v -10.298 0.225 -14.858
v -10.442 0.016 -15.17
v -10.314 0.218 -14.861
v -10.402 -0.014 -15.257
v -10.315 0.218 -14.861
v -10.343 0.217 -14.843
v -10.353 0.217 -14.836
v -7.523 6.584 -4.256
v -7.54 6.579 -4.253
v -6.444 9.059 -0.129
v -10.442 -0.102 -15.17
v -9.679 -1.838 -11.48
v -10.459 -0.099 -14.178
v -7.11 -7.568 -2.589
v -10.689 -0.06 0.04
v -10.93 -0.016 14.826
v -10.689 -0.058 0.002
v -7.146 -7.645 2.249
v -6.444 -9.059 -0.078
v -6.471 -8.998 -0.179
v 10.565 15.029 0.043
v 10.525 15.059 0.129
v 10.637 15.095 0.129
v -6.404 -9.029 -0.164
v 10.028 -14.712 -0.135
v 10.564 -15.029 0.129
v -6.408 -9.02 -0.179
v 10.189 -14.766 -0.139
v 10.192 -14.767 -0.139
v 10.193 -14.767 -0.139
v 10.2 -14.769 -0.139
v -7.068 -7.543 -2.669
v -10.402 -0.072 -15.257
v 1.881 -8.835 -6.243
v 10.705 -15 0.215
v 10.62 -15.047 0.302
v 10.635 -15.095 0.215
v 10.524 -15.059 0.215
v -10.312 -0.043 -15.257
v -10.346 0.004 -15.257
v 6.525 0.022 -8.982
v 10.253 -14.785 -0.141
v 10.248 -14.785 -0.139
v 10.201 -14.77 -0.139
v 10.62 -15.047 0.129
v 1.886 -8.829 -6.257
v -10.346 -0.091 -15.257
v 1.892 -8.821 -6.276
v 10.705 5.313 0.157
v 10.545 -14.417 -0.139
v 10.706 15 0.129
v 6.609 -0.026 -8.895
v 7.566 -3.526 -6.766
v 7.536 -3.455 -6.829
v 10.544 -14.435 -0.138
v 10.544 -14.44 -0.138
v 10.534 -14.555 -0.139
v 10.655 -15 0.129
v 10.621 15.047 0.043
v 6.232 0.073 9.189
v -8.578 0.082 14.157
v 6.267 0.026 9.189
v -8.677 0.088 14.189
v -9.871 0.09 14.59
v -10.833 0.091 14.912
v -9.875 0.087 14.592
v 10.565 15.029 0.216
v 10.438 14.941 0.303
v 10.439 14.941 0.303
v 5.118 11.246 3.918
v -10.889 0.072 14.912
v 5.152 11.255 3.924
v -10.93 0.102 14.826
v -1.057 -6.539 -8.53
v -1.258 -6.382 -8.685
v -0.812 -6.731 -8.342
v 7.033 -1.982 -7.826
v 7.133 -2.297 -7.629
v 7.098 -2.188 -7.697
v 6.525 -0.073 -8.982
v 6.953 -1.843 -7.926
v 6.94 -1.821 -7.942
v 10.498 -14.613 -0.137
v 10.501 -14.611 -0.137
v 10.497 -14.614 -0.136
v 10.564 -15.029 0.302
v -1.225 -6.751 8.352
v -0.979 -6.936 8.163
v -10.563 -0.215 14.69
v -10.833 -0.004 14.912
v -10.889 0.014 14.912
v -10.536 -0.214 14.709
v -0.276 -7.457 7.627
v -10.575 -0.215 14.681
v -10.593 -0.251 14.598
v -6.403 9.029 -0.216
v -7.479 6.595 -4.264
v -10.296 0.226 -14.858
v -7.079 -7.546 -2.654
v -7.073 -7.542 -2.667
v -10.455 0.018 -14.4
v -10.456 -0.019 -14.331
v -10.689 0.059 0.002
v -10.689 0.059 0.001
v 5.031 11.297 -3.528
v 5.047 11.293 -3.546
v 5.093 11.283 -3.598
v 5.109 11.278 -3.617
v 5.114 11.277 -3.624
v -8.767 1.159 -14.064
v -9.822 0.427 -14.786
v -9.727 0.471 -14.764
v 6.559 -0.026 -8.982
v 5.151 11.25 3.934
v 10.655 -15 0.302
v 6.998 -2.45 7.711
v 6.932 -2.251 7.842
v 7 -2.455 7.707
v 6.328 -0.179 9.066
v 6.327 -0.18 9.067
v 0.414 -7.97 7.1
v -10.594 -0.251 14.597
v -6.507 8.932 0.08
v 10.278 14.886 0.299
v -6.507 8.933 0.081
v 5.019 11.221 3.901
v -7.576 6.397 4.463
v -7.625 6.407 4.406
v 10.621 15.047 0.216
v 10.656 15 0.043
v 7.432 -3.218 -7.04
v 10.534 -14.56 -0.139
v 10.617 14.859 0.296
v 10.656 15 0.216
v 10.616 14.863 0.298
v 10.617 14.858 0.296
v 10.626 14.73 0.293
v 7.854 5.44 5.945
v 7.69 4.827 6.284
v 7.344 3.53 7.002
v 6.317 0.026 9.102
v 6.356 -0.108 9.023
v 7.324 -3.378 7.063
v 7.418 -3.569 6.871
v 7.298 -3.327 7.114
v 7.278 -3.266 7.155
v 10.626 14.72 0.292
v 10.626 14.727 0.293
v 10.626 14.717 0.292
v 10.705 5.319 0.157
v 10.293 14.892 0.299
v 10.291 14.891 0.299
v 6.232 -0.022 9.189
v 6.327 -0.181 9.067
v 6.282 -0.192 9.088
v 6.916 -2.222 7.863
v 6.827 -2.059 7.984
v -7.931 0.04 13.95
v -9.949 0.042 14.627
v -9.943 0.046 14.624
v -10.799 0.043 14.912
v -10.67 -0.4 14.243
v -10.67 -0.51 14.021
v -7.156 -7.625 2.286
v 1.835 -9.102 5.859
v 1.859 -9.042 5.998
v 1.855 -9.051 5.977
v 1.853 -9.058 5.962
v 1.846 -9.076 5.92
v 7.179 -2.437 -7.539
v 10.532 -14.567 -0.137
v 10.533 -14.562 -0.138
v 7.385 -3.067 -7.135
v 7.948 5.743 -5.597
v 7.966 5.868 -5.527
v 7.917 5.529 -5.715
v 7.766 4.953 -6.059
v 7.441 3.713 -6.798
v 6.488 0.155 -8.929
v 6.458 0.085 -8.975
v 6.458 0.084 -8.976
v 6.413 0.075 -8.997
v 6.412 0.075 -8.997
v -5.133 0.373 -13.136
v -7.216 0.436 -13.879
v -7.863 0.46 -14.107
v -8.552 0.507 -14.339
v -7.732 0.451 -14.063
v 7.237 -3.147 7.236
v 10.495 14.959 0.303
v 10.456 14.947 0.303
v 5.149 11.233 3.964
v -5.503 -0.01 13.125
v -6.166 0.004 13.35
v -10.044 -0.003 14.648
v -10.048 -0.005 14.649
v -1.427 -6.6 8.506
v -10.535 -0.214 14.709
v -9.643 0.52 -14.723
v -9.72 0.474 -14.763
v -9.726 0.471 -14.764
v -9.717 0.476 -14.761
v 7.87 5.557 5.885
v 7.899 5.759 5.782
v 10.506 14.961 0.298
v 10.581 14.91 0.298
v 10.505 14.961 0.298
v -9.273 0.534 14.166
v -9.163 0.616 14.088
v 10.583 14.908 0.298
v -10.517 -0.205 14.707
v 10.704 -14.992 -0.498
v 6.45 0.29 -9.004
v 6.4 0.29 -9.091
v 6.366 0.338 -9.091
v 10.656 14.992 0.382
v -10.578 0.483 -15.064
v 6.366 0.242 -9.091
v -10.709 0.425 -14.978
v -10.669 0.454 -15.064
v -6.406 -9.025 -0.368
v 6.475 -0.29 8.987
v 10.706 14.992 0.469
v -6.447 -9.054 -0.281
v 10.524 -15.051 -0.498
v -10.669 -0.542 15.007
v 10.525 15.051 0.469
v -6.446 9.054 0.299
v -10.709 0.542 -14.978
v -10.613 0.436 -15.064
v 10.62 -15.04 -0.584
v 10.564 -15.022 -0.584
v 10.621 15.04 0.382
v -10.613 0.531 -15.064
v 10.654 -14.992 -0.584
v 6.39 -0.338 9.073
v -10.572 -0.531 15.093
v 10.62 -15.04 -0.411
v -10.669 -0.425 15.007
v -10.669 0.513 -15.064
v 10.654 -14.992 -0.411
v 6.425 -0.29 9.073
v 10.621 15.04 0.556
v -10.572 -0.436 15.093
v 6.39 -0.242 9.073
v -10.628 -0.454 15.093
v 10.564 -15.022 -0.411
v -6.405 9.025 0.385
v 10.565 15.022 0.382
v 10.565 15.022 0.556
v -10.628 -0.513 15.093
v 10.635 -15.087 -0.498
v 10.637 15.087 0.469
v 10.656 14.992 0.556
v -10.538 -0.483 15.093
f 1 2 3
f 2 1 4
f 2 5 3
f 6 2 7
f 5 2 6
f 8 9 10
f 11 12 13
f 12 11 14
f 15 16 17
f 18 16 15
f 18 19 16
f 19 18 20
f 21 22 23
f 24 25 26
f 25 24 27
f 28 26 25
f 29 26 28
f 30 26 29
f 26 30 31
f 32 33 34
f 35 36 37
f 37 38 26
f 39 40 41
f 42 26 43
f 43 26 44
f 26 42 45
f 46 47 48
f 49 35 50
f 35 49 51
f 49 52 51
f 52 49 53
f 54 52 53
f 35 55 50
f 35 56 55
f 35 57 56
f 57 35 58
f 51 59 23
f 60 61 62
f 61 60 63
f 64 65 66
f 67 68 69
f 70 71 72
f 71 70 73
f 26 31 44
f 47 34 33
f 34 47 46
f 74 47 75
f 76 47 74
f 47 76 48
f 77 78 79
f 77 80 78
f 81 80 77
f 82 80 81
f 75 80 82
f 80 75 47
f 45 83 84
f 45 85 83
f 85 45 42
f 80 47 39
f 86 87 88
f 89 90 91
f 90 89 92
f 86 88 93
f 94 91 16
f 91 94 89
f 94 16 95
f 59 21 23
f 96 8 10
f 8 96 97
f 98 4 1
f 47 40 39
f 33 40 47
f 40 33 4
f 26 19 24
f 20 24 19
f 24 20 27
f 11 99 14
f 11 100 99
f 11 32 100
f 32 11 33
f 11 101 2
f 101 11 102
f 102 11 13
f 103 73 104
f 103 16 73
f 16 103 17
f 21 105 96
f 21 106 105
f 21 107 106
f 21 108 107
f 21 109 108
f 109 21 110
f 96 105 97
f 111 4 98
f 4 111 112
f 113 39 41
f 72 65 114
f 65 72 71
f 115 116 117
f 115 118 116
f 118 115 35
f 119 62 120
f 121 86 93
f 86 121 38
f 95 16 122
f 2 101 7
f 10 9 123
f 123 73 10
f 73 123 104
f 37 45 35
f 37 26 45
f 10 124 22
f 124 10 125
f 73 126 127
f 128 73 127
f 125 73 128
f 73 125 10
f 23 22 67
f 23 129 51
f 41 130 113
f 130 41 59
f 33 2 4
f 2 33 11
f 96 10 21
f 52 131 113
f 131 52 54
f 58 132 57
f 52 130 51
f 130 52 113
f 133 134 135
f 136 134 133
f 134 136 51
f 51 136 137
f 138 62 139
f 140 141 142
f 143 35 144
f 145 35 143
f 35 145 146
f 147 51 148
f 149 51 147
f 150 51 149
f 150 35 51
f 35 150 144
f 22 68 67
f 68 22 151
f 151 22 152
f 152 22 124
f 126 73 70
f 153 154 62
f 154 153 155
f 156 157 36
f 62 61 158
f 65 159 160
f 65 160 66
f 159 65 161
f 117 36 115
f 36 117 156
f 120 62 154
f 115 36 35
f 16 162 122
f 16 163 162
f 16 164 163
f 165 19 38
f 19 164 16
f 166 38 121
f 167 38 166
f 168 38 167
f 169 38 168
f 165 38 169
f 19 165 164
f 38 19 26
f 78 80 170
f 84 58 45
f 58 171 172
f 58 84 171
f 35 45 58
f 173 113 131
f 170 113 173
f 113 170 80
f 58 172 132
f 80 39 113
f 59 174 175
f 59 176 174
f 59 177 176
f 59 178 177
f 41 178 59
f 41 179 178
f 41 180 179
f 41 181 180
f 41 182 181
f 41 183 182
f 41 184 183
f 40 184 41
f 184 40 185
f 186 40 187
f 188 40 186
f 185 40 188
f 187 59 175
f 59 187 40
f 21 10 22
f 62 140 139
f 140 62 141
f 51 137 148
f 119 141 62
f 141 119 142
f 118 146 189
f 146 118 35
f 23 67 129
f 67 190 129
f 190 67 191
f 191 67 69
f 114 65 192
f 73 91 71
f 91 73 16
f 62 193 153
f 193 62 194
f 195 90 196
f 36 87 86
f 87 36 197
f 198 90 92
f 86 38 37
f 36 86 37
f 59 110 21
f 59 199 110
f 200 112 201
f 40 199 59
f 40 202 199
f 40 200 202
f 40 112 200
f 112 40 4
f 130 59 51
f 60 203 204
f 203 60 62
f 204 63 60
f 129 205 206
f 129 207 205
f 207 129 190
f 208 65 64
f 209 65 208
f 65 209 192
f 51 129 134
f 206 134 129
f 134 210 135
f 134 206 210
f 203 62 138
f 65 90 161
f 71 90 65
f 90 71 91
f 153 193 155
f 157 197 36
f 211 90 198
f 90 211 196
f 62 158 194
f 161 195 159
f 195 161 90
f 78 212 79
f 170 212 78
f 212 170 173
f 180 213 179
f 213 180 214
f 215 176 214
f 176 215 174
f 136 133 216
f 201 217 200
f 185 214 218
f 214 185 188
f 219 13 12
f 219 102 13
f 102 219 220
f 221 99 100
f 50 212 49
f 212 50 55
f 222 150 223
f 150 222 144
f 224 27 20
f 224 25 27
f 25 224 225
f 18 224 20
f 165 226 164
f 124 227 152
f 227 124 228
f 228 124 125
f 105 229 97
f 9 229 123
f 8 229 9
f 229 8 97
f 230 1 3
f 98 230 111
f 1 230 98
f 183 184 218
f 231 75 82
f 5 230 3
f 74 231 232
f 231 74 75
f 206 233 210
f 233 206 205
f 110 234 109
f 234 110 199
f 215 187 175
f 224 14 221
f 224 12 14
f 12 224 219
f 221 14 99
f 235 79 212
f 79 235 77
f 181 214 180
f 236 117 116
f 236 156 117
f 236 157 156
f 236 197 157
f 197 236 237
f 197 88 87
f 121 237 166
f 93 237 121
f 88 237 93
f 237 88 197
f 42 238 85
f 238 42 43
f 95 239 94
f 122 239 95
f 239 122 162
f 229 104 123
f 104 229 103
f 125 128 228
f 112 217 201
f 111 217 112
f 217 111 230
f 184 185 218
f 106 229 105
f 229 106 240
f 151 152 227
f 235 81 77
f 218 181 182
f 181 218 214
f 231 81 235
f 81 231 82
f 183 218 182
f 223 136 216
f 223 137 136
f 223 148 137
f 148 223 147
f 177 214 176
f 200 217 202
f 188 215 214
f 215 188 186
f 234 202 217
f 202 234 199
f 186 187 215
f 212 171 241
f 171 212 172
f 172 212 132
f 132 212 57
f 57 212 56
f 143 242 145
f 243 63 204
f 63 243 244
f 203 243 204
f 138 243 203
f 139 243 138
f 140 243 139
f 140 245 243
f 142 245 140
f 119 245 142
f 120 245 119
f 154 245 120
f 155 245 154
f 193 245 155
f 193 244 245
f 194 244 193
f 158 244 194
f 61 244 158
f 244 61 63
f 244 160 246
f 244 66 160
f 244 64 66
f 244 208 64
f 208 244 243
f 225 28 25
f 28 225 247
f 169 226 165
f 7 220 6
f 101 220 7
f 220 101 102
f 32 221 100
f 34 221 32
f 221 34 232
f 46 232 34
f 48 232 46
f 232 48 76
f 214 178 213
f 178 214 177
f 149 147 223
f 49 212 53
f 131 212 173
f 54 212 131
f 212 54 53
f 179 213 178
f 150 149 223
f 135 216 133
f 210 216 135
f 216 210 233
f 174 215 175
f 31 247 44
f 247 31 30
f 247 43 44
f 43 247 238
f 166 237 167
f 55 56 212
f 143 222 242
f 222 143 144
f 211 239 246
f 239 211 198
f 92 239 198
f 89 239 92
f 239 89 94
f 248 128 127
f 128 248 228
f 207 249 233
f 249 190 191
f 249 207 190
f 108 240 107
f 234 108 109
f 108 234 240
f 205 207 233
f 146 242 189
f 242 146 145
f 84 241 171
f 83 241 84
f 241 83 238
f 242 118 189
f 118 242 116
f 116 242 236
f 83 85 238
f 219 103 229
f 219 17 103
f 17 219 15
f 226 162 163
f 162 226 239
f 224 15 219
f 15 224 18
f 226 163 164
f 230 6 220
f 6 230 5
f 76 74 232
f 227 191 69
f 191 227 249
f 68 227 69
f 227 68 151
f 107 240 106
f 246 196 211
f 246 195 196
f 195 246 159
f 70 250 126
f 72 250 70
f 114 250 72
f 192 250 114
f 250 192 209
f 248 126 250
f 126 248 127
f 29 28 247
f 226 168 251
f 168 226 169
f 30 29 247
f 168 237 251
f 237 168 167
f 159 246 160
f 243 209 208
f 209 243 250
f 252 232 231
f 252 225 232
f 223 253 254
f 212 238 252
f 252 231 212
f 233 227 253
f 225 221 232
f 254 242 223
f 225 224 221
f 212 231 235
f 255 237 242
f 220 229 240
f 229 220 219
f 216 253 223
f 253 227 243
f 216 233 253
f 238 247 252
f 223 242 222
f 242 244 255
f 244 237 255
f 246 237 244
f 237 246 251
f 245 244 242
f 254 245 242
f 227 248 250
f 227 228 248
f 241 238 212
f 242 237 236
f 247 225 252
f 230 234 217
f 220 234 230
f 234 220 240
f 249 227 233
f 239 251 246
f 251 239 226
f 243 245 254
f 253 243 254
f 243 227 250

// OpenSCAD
// Auto-generated OpenSCAD file

    inner_points = 10*[[1.0604459675587286, -1.499224011924999, -0.04976923122714006], [1.0605858378028112, 1.499218084698337, 0.04690017258485223], [-1.0628300308746872, 0.04833824506895366, -1.4977851479919946], [-1.0587749704965013, -0.04833125950038337, 1.5006542066342825], [0.6350357038940415, 0.02899917903699332, -0.9003925239805696], [0.6374687401209531, -0.029002523704608985, 0.8986710887951969], [-0.6365807810855463, -0.899530427482239, -0.028140103550911386], [-0.6364968589390965, 0.8995348304917629, 0.029861538736284082]];

    outer_points = 10*[[1.060590175160667, 1.4999938160676403, 0.012924090354969903], [1.0604502328208316, -1.4999938160676403, 0.021537304127526278], [-1.0848879892588956, 0.004307175273605468, 1.4825651752968407], [-1.036152418722603, -0.004307175273605468, -1.517026569779337], [0.6216914512335617, 0.002584305164163303, 0.9102159418676022], [0.6509327935553374, -0.002584305164163303, -0.8895391051781046], [-0.636270139692499, 0.8999962896405842, -0.012922382476515787], [-0.6363541050964001, -0.8999962896405842, -0.0077544542129819195]];

    // Convex hull for inner set (I)
    module inner_hull() {
        hull() {
            for (p = inner_points) {
                translate(p) sphere(r=0.1);
            }
        }
    }

    // Convex hull for outer set (O) minus inner hull (O \ I)
    module outer_minus_inner() {
        difference() {
            hull() {
                for (p = outer_points) {
                    translate(p) sphere(r=0.1);
                }
            }
            inner_hull(); // Subtract inner hull
        }
    }

    // Convex hull for outer set (O) minus all translated inner hulls
    module outer_minus_AllTranslationInner() {
        difference() {
            hull() {
                for (p = outer_points) {
                    translate(p) sphere(r=0.1);
                }
            }
            hull() {
                translate([0,0,50]) inner_hull();
                translate([0,0,-50]) inner_hull();
            }; // Subtract translated inner hulls
        }
    }

    // Difference between outer_minus_inner and outer_minus_AllTranslationInner
    module outer_minus_inner_diff() {
        difference() {
            // Outer minus inner
            difference() {
                hull() {
                    for (p = outer_points) {
                        translate(p) sphere(r=0.1);
                    }
                }
                inner_hull();
            }

            // Subtract Outer minus AllTranslationInner
            difference() {
                hull() {
                    for (p = outer_points) {
                        translate(p) sphere(r=0.1);
                    }
                }
                hull() {
                    translate([0,0,50]) inner_hull();
                    translate([0,0,-50]) inner_hull();
                };
            }
        }
    }

    // Rendering all with colors applied
    color([1, 0, 0, 0.5]) inner_hull(); // Transparent red
    color([0, 0, 1, 1]) outer_minus_inner(); // Opaque blue
    // color([0, 1, 0, 1]) outer_minus_AllTranslationInner(); // Opaque green
    color([1, 1, 0, 1]) outer_minus_inner_diff(); // Opaque yellow
    
